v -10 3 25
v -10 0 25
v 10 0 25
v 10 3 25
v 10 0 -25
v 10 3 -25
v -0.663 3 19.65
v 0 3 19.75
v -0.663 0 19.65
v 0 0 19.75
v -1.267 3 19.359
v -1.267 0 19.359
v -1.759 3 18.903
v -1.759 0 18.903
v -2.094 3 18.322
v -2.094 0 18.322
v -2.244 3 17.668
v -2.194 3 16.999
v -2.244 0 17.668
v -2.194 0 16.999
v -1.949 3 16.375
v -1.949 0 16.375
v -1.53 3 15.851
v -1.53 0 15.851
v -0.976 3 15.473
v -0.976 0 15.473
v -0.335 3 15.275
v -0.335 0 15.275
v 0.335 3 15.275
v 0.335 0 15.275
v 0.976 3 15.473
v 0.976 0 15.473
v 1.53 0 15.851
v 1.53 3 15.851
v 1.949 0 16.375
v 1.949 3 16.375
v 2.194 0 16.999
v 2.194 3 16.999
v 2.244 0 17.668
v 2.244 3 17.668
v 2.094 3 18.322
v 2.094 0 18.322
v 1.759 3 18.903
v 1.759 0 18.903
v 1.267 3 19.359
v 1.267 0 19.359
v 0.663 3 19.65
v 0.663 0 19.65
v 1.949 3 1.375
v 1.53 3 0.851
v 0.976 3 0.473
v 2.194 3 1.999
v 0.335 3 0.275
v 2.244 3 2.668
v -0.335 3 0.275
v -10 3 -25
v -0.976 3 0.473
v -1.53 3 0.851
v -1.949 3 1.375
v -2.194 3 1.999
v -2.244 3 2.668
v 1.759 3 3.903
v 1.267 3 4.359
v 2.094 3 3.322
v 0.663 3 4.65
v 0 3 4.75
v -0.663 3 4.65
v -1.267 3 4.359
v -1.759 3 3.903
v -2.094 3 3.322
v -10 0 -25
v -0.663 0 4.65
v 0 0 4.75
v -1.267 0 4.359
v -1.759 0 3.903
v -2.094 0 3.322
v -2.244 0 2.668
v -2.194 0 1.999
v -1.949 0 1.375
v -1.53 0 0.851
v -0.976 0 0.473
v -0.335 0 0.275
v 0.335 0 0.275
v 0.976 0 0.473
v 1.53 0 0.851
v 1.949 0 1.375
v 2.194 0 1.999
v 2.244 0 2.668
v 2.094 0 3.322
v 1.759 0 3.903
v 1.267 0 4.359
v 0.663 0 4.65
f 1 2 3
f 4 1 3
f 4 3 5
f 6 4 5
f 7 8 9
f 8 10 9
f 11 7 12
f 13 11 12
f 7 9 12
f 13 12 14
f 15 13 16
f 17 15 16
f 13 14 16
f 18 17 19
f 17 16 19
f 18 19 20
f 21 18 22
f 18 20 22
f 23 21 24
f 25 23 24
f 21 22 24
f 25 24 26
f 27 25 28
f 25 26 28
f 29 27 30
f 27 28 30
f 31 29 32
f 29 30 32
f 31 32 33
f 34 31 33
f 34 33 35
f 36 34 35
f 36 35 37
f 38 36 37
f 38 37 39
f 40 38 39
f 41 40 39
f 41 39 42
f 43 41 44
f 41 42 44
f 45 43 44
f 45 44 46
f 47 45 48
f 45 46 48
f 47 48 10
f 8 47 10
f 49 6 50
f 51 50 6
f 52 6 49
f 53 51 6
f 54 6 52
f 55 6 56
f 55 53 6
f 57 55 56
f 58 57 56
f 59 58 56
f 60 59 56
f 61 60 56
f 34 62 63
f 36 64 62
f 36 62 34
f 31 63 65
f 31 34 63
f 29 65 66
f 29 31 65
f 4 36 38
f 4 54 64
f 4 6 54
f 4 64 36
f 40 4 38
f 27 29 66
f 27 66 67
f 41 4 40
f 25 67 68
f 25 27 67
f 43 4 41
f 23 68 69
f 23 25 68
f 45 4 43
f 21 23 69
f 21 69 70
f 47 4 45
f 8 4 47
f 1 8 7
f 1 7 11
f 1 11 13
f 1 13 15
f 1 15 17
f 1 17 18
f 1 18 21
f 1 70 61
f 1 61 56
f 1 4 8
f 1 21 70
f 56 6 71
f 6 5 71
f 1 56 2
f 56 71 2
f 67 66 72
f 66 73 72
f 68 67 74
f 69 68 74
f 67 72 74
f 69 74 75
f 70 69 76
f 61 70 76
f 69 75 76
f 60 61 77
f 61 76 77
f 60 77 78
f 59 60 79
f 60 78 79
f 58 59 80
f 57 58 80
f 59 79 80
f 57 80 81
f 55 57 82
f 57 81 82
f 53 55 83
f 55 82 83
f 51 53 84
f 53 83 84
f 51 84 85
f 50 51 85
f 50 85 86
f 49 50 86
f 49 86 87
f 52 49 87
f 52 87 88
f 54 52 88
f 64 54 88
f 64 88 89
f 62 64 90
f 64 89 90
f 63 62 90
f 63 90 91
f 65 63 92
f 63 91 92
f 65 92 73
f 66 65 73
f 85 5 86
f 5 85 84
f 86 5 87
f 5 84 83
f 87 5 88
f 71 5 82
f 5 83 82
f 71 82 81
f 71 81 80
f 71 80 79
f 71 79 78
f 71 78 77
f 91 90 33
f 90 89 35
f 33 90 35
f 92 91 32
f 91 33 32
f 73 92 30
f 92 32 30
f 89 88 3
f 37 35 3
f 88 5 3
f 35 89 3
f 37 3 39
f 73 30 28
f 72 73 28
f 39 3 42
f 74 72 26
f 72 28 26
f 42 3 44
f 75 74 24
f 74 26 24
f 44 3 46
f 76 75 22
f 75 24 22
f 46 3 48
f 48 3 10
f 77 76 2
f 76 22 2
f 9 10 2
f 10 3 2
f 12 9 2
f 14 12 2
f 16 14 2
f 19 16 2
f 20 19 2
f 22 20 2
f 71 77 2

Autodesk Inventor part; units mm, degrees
ref_plane "YZ Plane" through (0, 0, 0) normal (1, 0, 0) x (0, 1, 0)
ref_plane "XZ Plane" through (0, 0, 0) normal (0, 1, 0) x (-1, 0, 0)
ref_plane "XY Plane" through (0, 0, 0) normal (0, 0, 1) x (1, 0, 0)
sketch "Sketch1" plane through (0, 0, 0) normal (0, 1, 0) x (-1, 0, 0)
  line L0 (10, 25) -> (-10, 25)
  line L1 (-10, 25) -> (-10, -25)
  line L2 (-10, -25) -> (10, -25)
  line L3 (10, -25) -> (10, 25)
  point P0 (0, 0)
  point P1 (0, -25)
  point P2 (10, 0)
  dimension "d0" = 20
  dimension "d1" = 50
extrude "Extrusion1" add sketch "Sketch1" along normal blind 3
sketch "Sketch2" plane through (0, 3, 0) normal (0, 1, 0) x (1, 0, 0)
  line L0 (-10, -25) -> (10, -25) projected
  point P0 (0, 0)
  point P1 (0, -17.5)
  point P2 (0, -2.5)
  dimension "d4" = 15
  dimension "d6" = 7.5
hole "Hole1" at (0, 3, 17.5) at (0, 3, 2.5) direction (0, -1, 0) diameter 4.5 end through all
properties part number "Endstop Mounting Plate"
